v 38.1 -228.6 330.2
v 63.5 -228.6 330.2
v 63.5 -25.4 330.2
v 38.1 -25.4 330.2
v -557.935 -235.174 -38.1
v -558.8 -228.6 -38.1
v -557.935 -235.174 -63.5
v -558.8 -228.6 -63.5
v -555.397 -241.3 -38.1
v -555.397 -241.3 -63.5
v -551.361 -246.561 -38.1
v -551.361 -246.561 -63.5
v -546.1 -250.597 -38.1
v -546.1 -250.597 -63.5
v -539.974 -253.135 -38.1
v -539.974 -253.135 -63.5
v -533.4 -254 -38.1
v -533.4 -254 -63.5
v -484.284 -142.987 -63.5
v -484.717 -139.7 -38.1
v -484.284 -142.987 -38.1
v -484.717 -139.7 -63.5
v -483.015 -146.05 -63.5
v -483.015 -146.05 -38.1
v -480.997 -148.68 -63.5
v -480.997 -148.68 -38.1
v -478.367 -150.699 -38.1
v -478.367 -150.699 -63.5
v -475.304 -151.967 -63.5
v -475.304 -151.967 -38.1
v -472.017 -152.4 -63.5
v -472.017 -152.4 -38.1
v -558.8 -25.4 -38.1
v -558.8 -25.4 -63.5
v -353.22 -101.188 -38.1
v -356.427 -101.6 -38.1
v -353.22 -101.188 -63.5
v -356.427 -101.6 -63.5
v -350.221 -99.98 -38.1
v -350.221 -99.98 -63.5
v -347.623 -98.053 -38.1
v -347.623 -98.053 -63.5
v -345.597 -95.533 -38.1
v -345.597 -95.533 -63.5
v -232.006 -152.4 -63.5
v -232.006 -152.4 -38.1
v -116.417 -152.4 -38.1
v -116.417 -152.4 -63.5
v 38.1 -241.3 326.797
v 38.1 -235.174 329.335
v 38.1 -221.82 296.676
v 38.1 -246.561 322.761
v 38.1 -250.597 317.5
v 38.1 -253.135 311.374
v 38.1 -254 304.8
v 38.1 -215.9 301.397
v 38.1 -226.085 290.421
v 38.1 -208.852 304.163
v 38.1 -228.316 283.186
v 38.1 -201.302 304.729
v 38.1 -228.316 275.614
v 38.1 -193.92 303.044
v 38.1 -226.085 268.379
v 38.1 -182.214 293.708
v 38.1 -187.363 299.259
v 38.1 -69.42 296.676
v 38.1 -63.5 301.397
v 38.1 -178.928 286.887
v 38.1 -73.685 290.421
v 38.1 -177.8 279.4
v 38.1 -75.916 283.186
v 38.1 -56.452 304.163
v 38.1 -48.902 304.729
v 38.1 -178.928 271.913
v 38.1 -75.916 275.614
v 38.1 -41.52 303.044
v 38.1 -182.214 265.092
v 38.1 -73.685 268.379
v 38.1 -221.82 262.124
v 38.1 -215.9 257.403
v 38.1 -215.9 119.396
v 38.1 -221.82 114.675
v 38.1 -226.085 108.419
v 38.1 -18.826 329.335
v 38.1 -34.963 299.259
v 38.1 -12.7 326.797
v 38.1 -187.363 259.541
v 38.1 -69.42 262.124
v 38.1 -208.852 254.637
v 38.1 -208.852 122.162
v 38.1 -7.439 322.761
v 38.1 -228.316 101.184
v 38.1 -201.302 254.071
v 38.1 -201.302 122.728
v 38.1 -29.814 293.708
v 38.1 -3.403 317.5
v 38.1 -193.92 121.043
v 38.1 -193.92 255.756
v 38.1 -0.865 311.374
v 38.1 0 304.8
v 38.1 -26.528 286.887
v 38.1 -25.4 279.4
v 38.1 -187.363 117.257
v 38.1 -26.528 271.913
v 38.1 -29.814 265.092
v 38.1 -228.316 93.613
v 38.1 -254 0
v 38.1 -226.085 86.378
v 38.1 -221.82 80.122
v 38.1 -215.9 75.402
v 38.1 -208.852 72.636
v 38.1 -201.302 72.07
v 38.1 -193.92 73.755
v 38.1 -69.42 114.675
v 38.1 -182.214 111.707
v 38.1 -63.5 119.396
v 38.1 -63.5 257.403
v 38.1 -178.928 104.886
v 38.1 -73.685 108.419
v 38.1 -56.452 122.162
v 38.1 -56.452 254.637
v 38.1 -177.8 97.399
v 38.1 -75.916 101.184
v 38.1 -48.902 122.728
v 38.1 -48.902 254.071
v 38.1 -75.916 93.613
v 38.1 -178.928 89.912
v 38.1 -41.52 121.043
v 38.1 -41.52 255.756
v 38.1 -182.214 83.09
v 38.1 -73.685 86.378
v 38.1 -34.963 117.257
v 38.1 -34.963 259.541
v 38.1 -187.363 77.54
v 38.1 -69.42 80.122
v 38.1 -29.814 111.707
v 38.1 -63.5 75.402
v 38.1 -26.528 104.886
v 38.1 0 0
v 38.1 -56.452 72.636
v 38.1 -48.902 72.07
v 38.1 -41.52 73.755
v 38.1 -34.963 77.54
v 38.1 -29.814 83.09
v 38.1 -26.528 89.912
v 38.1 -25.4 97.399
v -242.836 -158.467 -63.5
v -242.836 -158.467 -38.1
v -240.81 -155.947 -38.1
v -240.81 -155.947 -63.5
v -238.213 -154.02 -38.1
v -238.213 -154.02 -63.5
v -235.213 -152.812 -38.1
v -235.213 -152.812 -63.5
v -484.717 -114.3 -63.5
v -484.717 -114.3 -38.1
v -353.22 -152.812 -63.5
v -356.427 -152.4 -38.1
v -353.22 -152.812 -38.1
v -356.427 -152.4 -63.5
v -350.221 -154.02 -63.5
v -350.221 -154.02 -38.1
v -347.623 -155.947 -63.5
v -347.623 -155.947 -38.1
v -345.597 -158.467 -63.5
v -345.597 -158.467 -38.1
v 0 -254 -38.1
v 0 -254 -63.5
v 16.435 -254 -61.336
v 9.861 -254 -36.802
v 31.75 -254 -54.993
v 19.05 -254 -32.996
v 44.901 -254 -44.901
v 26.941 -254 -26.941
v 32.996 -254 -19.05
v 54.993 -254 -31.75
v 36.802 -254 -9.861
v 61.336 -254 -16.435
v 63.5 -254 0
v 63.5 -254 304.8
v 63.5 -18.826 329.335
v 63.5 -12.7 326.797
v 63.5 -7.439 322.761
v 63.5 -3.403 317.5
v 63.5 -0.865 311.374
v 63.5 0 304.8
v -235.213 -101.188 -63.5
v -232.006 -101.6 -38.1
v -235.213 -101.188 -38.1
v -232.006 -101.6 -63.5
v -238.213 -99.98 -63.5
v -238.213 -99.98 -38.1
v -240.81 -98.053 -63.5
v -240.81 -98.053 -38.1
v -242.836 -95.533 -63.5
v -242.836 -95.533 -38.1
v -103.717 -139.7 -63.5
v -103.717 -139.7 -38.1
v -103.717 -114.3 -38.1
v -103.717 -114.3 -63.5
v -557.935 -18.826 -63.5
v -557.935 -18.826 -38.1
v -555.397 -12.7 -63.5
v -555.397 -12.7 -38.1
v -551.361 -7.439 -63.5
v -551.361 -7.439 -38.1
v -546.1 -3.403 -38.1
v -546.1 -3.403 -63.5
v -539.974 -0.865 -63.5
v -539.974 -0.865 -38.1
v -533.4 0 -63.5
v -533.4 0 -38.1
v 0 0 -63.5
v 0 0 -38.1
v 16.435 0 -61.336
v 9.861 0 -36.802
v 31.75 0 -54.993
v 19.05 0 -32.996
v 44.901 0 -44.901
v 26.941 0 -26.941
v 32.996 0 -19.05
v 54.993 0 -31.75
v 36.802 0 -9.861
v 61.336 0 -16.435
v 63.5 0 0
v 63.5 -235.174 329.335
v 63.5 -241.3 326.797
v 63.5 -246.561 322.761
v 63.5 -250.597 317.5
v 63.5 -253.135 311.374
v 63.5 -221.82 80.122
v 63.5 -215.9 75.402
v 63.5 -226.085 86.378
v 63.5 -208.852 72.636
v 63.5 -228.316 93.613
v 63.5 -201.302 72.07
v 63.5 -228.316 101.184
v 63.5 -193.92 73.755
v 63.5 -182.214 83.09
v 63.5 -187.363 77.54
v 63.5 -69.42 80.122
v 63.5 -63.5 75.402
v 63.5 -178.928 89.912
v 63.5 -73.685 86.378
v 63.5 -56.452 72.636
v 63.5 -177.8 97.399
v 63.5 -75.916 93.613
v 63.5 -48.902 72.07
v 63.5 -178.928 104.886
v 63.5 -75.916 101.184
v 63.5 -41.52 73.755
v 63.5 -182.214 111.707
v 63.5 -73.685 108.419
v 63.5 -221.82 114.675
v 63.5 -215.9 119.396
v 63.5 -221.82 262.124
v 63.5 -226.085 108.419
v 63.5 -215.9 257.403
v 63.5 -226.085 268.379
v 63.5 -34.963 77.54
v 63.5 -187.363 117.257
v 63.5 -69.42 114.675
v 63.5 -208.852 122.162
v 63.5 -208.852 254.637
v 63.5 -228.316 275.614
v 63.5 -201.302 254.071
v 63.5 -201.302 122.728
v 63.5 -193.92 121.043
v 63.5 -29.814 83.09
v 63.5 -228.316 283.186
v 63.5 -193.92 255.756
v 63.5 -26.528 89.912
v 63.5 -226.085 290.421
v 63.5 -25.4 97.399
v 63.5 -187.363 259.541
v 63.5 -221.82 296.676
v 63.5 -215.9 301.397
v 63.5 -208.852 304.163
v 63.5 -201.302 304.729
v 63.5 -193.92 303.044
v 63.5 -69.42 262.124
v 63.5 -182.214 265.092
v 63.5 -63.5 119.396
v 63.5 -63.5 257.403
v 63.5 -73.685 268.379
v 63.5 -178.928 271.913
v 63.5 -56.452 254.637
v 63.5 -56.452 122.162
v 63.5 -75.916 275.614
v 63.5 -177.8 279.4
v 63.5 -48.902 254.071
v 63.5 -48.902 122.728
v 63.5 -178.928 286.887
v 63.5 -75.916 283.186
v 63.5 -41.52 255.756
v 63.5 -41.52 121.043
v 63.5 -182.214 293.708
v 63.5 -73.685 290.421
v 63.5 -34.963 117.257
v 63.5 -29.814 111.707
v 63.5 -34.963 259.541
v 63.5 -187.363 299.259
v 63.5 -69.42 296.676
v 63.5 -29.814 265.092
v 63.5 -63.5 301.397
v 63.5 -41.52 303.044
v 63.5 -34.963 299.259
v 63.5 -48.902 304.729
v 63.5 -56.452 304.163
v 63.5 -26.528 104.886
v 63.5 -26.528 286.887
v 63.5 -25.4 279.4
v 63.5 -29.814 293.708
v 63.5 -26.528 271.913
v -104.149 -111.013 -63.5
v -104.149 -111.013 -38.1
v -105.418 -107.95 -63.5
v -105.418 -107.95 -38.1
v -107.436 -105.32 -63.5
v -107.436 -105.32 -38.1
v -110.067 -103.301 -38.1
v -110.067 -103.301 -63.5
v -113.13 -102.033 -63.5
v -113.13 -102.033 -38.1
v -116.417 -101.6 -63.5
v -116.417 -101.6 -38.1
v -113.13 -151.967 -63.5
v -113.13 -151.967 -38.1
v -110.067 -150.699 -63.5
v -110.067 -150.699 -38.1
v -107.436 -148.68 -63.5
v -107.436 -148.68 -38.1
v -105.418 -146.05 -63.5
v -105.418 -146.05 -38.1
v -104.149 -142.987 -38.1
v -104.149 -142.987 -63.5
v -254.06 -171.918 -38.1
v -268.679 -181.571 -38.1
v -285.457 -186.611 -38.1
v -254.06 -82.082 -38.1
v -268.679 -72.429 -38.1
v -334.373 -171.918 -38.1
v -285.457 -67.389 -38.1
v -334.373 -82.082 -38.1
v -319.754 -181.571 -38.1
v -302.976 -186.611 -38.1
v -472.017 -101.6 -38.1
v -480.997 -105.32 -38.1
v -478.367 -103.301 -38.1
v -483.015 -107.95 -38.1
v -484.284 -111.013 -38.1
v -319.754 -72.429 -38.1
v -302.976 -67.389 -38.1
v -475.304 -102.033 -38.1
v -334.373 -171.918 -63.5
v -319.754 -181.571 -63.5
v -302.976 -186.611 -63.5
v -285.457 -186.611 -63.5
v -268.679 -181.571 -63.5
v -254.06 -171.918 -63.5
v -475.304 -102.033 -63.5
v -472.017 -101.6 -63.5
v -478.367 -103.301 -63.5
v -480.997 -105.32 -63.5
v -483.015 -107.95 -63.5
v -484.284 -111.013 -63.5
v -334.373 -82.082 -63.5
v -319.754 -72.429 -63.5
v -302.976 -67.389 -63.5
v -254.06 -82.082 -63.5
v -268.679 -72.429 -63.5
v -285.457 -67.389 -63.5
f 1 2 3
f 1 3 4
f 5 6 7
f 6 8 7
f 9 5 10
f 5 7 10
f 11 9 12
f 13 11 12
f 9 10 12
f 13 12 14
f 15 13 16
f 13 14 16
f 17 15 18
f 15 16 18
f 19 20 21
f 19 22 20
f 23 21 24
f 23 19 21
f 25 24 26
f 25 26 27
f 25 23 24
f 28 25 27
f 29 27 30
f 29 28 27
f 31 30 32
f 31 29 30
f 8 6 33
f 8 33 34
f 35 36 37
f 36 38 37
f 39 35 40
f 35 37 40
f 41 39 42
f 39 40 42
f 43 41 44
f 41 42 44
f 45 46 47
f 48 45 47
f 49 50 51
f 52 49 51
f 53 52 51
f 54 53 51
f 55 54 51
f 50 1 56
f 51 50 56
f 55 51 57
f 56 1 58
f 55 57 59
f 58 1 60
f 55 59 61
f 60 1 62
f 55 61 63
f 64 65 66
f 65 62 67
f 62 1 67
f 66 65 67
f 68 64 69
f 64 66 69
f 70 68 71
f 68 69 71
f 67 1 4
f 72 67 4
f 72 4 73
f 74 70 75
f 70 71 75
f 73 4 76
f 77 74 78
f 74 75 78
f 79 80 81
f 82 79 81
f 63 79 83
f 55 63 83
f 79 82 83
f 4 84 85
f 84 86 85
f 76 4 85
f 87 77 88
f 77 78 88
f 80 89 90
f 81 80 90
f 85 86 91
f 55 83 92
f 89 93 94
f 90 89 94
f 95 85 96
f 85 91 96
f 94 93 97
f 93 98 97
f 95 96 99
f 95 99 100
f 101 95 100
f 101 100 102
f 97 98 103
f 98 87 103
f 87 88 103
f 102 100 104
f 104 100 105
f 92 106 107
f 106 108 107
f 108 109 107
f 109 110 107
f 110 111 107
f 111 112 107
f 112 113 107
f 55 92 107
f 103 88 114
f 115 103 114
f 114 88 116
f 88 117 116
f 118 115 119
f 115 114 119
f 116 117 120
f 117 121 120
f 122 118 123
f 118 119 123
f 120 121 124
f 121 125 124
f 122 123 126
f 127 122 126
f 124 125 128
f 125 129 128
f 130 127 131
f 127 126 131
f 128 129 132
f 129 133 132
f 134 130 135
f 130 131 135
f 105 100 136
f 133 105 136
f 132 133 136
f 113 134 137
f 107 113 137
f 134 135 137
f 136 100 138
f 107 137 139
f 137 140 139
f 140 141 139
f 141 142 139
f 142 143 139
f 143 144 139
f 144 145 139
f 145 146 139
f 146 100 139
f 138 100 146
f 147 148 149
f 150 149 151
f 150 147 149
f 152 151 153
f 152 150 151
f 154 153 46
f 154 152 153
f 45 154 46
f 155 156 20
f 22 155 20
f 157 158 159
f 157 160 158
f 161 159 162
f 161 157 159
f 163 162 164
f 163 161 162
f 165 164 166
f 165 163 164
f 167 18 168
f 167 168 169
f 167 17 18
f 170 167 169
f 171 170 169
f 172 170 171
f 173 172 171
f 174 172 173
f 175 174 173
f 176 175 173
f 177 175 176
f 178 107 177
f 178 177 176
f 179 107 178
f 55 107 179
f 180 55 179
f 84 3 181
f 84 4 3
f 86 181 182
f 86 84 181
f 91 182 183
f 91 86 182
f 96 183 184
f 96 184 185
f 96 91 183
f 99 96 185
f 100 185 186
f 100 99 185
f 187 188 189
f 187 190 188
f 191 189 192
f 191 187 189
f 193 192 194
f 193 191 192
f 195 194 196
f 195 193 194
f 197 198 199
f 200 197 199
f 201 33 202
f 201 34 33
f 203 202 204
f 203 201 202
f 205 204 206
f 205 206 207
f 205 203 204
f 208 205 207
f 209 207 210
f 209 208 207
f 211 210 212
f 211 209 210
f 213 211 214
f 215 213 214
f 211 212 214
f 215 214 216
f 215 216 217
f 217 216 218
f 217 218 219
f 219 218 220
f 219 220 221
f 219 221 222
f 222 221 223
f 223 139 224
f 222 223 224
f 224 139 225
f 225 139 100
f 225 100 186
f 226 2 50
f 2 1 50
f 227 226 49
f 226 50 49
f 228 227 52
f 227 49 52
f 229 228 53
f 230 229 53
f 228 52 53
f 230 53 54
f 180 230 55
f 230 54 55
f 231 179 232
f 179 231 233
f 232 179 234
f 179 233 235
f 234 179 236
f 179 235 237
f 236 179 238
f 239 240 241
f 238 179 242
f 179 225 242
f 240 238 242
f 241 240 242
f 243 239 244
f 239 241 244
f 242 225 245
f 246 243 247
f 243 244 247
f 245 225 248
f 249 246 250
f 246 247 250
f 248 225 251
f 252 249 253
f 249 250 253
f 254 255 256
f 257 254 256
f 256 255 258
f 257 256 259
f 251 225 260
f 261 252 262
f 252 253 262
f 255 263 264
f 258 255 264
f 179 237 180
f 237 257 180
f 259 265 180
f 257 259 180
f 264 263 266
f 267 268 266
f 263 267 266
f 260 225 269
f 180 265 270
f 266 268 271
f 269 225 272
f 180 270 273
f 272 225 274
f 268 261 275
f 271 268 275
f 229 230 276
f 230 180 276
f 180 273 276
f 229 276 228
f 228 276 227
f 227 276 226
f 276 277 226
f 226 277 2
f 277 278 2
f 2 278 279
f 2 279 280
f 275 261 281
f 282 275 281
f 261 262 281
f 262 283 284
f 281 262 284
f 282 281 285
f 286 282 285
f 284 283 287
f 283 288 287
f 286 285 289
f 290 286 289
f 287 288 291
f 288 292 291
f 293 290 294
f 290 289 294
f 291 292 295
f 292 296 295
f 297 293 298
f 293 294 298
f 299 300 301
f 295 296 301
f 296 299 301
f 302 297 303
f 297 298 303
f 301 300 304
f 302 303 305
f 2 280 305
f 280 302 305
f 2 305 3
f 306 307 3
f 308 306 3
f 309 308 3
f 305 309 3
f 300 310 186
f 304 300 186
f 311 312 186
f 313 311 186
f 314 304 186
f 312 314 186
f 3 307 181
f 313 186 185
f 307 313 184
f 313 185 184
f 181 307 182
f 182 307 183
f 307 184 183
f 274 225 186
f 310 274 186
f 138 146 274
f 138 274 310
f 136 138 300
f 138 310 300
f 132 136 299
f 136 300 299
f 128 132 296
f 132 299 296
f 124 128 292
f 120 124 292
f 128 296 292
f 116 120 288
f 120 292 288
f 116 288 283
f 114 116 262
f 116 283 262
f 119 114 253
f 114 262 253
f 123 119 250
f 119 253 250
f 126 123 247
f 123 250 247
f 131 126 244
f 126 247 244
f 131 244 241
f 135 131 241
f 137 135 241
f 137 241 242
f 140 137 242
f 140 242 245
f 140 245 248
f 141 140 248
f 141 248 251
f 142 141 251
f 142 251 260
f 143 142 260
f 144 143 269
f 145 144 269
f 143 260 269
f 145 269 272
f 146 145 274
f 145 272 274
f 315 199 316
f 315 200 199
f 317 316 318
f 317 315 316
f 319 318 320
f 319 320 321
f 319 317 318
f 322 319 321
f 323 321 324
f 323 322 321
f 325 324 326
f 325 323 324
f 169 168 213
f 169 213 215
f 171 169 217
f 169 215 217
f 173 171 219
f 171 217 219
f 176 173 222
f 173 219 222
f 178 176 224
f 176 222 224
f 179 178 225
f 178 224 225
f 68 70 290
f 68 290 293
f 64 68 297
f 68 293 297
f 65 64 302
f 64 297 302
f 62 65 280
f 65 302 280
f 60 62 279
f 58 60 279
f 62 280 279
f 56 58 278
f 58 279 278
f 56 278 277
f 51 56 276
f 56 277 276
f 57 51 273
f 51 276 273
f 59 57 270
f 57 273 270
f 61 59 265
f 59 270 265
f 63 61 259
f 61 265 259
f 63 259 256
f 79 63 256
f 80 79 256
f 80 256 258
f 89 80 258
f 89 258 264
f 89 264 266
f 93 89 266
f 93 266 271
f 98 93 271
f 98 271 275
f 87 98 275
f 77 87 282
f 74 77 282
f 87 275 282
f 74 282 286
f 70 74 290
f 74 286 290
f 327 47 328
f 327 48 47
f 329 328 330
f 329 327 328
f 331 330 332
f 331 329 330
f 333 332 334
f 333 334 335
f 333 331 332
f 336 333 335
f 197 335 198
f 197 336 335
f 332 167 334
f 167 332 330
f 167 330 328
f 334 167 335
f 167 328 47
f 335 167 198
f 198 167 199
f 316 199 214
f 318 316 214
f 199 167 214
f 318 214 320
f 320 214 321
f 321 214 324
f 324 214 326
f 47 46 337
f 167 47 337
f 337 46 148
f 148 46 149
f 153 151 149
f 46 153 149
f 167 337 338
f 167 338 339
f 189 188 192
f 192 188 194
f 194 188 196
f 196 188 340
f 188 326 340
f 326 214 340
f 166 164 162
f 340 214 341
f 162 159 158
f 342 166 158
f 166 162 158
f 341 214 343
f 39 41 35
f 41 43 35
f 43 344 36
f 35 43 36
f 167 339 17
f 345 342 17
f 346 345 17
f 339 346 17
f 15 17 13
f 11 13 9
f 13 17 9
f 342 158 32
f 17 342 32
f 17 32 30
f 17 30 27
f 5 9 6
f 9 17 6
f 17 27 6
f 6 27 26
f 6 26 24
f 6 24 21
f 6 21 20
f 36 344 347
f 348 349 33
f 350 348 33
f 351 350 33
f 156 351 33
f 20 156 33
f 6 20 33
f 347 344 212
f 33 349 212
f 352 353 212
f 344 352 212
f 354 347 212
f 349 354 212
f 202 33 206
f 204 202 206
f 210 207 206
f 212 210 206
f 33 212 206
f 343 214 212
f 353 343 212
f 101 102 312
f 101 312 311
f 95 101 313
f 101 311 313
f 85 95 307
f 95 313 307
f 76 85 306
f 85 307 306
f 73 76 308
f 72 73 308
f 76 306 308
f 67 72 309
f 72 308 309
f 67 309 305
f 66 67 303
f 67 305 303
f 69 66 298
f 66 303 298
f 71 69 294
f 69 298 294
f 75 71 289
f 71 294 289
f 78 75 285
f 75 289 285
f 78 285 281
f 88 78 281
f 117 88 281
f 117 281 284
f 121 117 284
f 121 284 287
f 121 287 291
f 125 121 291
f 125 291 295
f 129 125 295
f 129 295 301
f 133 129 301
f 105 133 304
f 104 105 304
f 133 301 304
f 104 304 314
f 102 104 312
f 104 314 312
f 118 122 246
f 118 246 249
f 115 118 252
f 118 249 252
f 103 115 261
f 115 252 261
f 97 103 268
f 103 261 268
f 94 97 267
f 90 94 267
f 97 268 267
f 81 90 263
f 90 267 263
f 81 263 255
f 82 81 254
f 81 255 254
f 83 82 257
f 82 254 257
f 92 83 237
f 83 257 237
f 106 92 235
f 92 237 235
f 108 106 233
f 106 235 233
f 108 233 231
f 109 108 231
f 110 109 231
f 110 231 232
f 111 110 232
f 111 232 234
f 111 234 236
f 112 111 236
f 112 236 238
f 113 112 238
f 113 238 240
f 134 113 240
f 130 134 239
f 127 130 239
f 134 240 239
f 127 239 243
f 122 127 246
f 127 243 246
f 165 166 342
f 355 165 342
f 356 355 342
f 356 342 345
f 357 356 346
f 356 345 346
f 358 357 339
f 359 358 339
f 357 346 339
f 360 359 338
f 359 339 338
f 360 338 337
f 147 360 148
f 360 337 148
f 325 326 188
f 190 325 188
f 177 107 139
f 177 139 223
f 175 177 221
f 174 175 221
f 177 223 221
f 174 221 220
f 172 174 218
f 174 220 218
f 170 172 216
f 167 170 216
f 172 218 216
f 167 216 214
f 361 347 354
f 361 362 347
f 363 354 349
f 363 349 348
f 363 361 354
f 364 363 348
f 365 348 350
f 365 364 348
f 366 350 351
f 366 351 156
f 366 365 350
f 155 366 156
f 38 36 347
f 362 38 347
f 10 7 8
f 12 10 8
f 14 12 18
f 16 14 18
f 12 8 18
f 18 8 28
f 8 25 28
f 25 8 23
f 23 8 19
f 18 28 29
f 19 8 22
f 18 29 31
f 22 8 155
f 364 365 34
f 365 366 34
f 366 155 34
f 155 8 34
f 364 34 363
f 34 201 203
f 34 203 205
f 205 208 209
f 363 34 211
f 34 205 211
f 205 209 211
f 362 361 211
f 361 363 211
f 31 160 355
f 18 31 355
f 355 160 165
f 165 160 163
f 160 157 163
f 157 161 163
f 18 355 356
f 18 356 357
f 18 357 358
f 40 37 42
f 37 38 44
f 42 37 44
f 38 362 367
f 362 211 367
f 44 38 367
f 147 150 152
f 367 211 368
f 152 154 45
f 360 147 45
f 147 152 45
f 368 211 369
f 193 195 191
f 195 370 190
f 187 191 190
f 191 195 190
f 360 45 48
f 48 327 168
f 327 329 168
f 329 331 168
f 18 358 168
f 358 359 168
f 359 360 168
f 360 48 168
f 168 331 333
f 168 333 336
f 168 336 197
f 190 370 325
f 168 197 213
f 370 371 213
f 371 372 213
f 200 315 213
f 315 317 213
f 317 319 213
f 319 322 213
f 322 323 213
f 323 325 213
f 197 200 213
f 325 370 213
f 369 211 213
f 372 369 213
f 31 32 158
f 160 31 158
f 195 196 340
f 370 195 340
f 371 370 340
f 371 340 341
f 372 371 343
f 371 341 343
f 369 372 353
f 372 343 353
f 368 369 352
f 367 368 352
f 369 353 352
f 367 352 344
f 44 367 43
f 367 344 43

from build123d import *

# Parameters (mm, degrees)
F1_DEPTH = 254
F2_R     = 25.4
F4_DEPTH = 25.4
F5_R     = 12.7
F6_R     = 25.4
F7_DEPTH = 25.4


with BuildPart() as f1:
    # F0 (on Front) → F1 (new body)
    with BuildSketch(Plane.XZ):
        with BuildLine():
            Line((-558.8, -63.5), (0, -63.5))
            ThreePointArc((0, -63.5), (44.9012806053, -44.9012806053), (63.5, 0))
            Line((63.5, 0), (63.5, 330.2))
            Line((63.5, 330.2), (38.1, 330.2))
            Line((38.1, 330.2), (38.1, 0))
            ThreePointArc((38.1, 0), (26.9407683632, -26.9407683632), (0, -38.1))
            Line((0, -38.1), (-558.8, -38.1))
            Line((-558.8, -38.1), (-558.8, -63.5))
        make_face()
    extrude(amount=F1_DEPTH)

    # F2
    f2_edges = [f1.edges().sort_by_distance(p)[0] for p in [
        (50.8, 0, 330.2),
        (50.8, -254, 330.2),
        (-558.8, 0, -50.8),
        (-558.8, -254, -50.8),
    ]]
    fillet(f2_edges, radius=F2_R)

    # F3 (on face) → F4 (cut)
    with BuildSketch(Plane.XY.offset(-38.1)):
        with BuildLine():
            Line((-348.8516446213, -101.6), (-484.7166538239, -101.6))
            Line((-484.7166538239, -101.6), (-484.7166538239, -152.4))
            Line((-484.7166538239, -152.4), (-348.8516446213, -152.4))
            ThreePointArc((-348.8516446213, -152.4), (-354.4673153923, -127), (-348.8516446213, -101.6))
        make_face()
        with BuildLine():
            ThreePointArc((-239.5816630264, -101.6), (-294.2166538239, -66.7493384316), (-348.8516446213, -101.6))
            Line((-348.8516446213, -101.6), (-239.5816630264, -101.6))
        make_face()
        with BuildLine():
            Line((-239.5816630264, -101.6), (-348.8516446213, -101.6))
            ThreePointArc((-348.8516446213, -101.6), (-354.4673153923, -127), (-348.8516446213, -152.4))
            Line((-348.8516446213, -152.4), (-239.5816630264, -152.4))
            ThreePointArc((-239.5816630264, -152.4), (-235.3866590943, -140.0066882623), (-233.9659922554, -127))
            ThreePointArc((-233.9659922554, -127), (-235.3866590943, -113.9933117377), (-239.5816630264, -101.6))
        make_face()
        with BuildLine():
            Line((-103.7166538239, -101.6), (-239.5816630264, -101.6))
            ThreePointArc((-239.5816630264, -101.6), (-235.3866590943, -113.9933117377), (-233.9659922554, -127))
            ThreePointArc((-233.9659922554, -127), (-235.3866590943, -140.0066882623), (-239.5816630264, -152.4))
            Line((-239.5816630264, -152.4), (-103.7166538239, -152.4))
            Line((-103.7166538239, -152.4), (-103.7166538239, -101.6))
        make_face()
        with BuildLine():
            Line((-239.5816630264, -152.4), (-348.8516446213, -152.4))
            ThreePointArc((-348.8516446213, -152.4), (-294.2166538239, -187.2506615684), (-239.5816630264, -152.4))
        make_face()
    extrude(amount=-F4_DEPTH, mode=Mode.SUBTRACT)

    # F5
    f5_edges = [f1.edges().sort_by_distance(p)[0] for p in [
        (-484.716654, -101.6, -50.8),
        (-348.851645, -101.6, -50.8),
        (-484.716654, -152.4, -50.8),
        (-348.851645, -152.4, -50.8),
        (-239.581663, -152.4, -50.8),
        (-239.581663, -101.6, -50.8),
        (-103.716654, -152.4, -50.8),
        (-103.716654, -101.6, -50.8),
    ]]
    fillet(f5_edges, radius=F5_R)

    # F6 (on face) → F7 (cut)
    with BuildSketch(Plane.YZ.offset(63.5)):
        with Locations((-50.8, 279.4)):
            Circle(F6_R)
        with Locations((-203.2, 279.4)):
            Circle(F6_R)
        with Locations((-50.8, 97.3987299839)):
            Circle(F6_R)
        with Locations((-203.2, 97.3987299839)):
            Circle(F6_R)
    extrude(amount=-F7_DEPTH, mode=Mode.SUBTRACT)


solid = f1.part
